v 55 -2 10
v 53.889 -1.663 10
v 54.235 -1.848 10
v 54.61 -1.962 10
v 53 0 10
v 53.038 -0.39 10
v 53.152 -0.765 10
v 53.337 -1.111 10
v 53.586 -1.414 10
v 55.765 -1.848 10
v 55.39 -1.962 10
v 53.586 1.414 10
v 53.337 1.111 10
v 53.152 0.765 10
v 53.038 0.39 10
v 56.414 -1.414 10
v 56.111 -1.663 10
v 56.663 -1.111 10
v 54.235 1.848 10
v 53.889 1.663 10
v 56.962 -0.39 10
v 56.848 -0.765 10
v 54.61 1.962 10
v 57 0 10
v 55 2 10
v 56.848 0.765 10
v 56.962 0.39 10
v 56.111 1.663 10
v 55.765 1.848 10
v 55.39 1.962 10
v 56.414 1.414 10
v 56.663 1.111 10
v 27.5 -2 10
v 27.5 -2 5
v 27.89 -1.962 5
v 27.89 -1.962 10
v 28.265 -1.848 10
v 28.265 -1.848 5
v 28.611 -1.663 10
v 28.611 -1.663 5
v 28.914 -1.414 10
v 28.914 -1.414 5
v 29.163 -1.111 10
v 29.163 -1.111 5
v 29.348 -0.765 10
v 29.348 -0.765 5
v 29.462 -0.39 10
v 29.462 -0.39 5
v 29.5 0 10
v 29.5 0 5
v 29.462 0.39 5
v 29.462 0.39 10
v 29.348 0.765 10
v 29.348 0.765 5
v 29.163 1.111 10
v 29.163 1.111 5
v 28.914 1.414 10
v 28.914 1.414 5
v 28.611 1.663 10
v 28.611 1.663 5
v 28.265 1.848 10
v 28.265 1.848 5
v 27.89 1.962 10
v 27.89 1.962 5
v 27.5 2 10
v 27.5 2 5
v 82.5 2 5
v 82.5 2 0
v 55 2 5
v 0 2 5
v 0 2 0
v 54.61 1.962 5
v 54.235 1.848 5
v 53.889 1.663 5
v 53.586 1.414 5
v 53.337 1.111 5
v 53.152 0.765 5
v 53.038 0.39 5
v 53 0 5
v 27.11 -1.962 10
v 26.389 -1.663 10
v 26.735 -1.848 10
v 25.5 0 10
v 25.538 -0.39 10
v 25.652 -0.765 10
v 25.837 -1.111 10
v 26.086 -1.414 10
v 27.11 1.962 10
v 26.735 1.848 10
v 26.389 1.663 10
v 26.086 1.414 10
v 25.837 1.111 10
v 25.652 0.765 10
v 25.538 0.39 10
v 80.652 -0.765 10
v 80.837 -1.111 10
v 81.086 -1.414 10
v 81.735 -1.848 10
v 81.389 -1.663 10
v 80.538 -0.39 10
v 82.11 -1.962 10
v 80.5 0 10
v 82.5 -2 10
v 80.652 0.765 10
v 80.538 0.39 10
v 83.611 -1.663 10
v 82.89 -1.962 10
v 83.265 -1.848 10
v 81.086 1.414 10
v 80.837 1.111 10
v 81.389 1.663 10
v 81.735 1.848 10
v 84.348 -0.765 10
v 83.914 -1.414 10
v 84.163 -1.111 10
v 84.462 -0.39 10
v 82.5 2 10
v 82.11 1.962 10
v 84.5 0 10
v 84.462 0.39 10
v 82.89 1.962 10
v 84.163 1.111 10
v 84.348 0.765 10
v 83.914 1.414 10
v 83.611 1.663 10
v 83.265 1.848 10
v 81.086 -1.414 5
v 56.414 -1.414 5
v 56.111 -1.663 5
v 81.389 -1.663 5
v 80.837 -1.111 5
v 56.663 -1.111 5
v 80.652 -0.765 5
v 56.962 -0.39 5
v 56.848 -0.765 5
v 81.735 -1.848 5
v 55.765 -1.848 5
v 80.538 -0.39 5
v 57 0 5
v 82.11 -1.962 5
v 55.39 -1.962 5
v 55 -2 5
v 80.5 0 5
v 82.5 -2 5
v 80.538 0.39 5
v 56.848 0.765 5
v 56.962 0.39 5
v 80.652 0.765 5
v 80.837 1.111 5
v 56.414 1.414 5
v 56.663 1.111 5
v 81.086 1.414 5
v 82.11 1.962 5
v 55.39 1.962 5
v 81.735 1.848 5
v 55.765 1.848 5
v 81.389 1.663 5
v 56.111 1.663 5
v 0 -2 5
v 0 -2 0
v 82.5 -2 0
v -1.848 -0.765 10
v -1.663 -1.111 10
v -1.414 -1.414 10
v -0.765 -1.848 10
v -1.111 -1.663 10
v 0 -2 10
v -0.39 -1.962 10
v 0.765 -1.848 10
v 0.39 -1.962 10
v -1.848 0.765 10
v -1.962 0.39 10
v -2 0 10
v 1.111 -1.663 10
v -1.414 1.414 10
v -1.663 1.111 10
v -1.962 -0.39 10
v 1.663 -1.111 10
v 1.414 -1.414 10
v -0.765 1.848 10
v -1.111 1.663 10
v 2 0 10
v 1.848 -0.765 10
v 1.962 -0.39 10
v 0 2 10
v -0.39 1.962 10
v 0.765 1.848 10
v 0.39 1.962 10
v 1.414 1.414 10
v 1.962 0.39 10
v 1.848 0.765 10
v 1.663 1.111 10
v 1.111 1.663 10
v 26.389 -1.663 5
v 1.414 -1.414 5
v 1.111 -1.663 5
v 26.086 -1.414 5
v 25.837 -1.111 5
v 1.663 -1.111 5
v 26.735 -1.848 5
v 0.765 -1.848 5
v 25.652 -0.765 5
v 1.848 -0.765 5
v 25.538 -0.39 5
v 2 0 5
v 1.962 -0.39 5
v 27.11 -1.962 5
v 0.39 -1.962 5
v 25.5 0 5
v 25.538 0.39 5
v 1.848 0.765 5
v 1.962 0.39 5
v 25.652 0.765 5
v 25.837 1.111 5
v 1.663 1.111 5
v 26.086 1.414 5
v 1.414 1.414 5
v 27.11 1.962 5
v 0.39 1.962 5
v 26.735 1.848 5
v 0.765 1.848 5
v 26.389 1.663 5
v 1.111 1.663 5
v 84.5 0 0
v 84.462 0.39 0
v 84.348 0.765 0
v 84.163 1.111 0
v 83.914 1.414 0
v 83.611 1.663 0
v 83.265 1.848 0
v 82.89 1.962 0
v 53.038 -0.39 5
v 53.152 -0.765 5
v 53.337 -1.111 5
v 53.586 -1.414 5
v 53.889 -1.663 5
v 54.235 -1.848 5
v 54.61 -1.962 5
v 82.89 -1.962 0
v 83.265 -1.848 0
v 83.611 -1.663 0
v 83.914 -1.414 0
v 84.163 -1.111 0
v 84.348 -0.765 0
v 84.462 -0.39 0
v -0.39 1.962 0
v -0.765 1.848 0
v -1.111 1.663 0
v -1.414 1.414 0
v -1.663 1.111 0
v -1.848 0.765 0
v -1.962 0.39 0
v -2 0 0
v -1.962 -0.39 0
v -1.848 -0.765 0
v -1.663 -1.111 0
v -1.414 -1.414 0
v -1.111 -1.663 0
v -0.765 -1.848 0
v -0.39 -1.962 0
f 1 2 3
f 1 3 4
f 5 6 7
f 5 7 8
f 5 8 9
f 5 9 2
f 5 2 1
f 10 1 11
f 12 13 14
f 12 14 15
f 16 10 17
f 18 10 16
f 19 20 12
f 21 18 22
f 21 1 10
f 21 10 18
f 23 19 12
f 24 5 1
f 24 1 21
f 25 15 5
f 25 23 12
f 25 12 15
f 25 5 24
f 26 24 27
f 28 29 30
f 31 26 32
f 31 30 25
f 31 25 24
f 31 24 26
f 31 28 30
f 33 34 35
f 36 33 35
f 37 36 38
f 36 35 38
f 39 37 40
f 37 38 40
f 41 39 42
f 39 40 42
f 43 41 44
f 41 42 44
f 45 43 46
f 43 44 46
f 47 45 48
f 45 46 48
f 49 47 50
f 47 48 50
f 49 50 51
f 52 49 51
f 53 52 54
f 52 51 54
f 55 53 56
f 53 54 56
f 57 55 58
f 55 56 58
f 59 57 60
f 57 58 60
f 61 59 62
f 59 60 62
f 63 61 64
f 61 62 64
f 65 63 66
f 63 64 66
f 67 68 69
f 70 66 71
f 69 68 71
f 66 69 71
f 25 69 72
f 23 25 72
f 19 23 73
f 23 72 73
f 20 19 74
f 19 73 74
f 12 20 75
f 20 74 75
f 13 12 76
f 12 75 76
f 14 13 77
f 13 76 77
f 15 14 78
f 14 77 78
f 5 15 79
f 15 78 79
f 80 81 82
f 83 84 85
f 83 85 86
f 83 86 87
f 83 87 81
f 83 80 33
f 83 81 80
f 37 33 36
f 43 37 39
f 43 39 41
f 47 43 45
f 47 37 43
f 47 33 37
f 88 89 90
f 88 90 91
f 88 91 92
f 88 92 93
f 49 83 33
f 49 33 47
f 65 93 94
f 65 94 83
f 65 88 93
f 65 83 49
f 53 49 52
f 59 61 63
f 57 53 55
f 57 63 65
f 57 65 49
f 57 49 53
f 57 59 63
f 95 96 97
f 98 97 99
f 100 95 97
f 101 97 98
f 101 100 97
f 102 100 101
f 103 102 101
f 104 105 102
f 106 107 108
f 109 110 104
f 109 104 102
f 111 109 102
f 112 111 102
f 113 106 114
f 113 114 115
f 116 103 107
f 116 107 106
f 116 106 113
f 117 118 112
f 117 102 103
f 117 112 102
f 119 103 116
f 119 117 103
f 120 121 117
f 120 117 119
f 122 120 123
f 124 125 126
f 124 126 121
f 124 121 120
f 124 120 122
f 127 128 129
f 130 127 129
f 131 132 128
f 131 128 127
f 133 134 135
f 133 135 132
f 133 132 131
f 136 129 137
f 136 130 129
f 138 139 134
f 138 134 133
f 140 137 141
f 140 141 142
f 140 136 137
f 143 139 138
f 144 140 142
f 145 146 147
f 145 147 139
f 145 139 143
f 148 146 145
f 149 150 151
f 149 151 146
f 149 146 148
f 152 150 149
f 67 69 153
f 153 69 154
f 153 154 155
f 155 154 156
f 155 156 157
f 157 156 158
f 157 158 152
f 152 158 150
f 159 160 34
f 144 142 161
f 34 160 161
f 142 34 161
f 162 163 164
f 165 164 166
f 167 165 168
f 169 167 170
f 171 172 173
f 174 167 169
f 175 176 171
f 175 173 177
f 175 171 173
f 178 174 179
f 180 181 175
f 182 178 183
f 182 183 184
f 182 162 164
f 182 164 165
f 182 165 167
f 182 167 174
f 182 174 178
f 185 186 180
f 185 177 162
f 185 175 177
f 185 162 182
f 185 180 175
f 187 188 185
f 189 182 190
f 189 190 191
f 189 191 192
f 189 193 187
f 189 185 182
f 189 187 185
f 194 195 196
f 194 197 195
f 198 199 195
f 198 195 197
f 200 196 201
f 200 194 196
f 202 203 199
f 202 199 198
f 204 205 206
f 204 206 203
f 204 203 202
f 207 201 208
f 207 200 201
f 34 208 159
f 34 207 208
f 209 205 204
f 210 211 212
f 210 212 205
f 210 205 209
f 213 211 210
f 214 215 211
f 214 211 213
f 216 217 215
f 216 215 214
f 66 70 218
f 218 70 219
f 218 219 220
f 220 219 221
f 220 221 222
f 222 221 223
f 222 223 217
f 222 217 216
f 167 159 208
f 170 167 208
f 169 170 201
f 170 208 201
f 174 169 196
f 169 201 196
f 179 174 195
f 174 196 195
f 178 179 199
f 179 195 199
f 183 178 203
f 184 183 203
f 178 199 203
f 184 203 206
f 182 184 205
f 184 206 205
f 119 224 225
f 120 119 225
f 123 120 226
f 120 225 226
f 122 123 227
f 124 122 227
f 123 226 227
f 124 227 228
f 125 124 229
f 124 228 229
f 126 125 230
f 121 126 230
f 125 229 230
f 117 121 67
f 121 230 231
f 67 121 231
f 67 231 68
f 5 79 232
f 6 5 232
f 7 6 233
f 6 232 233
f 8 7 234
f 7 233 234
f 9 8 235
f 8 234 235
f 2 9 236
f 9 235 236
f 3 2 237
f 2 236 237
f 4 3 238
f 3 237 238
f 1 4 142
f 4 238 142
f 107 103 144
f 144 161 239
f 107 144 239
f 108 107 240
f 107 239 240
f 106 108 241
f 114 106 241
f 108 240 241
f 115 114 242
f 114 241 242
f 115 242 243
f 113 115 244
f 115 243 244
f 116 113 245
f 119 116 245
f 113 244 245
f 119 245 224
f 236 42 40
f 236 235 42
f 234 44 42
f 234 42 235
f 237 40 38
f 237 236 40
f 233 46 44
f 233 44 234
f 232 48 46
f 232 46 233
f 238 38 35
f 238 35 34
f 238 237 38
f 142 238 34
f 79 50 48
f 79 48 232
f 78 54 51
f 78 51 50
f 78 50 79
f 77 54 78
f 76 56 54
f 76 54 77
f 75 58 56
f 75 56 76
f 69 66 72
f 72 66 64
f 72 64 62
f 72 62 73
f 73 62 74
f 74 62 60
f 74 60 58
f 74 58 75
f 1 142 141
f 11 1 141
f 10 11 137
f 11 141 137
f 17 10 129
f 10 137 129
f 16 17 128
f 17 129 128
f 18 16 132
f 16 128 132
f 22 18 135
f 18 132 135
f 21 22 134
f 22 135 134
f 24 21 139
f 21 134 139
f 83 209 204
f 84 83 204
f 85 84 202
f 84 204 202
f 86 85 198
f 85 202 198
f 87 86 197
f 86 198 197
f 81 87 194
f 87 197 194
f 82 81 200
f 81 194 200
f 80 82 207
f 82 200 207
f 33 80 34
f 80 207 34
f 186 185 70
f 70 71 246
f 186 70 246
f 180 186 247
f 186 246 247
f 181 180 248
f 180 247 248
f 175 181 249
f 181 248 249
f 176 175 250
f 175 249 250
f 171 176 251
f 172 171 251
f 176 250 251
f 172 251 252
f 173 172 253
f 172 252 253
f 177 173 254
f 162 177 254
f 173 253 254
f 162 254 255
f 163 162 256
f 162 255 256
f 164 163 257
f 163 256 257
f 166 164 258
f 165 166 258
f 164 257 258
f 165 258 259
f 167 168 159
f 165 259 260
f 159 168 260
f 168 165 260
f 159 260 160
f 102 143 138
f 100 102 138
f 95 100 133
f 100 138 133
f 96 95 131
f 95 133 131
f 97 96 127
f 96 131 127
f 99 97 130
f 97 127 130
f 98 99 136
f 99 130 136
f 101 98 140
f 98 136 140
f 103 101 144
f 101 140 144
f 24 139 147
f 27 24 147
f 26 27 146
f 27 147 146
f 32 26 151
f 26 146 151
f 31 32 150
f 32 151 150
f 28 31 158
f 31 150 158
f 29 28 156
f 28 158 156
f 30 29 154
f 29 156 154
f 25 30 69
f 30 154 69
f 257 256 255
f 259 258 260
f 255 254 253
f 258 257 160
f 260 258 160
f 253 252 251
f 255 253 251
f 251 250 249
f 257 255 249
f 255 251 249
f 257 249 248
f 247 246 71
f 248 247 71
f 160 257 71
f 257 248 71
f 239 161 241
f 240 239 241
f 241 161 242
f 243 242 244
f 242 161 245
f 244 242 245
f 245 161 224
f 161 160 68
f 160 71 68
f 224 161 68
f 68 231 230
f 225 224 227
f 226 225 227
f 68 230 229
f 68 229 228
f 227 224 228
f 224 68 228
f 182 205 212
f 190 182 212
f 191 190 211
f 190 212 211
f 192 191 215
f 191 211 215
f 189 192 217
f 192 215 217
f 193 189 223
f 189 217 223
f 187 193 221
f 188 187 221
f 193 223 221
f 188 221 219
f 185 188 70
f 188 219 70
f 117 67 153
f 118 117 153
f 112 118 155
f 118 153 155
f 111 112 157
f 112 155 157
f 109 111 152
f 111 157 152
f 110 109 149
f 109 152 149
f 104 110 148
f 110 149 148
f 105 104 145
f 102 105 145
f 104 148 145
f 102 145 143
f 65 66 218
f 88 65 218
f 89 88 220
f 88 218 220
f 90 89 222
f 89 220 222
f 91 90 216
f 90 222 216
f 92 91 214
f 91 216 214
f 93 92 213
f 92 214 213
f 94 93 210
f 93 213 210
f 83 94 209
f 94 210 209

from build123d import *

# Parameters (mm, degrees)
F1_DEPTH = 5
F2_DEPTH = 10


with BuildPart() as f1:
    # F0 (on Top) → F1 (new body)
    with BuildSketch(Plane.XY):
        with BuildLine():
            Line((25.5, 0), (2, 0))
            ThreePointArc((2, 0), (1.414214, -1.414214), (0, -2))
            Line((0, -2), (27.5, -2))
            ThreePointArc((27.5, -2), (26.085786, -1.414214), (25.5, 0))
        make_face()
        with BuildLine():
            ThreePointArc((0, 2), (1.414214, 1.414214), (2, 0))
            Line((2, 0), (25.5, 0))
            ThreePointArc((25.5, 0), (26.085786, 1.414214), (27.5, 2))
            Line((27.5, 2), (0, 2))
        make_face()
        with BuildLine():
            Line((0, 0), (0, 2))
            ThreePointArc((0, 2), (-2, 0), (0, -2))
            Line((0, -2), (0, 0))
        make_face()
        with BuildLine():
            Line((55, 2), (27.5, 2))
            ThreePointArc((27.5, 2), (28.914214, 1.414214), (29.5, 0))
            Line((29.5, 0), (53, 0))
            ThreePointArc((53, 0), (53.585786, 1.414214), (55, 2))
        make_face()
        with BuildLine():
            ThreePointArc((29.5, 0), (28.914214, -1.414214), (27.5, -2))
            Line((27.5, -2), (55, -2))
            ThreePointArc((55, -2), (53.585786, -1.414214), (53, 0))
            Line((53, 0), (29.5, 0))
        make_face()
        with BuildLine():
            Line((82.5, 2), (55, 2))
            ThreePointArc((55, 2), (56.414214, 1.414214), (57, 0))
            Line((57, 0), (80.5, 0))
            ThreePointArc((80.5, 0), (81.085786, 1.414214), (82.5, 2))
        make_face()
        with BuildLine():
            ThreePointArc((57, 0), (56.414214, -1.414214), (55, -2))
            Line((55, -2), (82.5, -2))
            ThreePointArc((82.5, -2), (81.085786, -1.414214), (80.5, 0))
            Line((80.5, 0), (57, 0))
        make_face()
        with BuildLine():
            ThreePointArc((84.5, 0), (83.914214, 1.414214), (82.5, 2))
            Line((82.5, 2), (82.5, 0))
            Line((82.5, 0), (82.5, -2))
            ThreePointArc((82.5, -2), (83.914214, -1.414214), (84.5, 0))
        make_face()
    extrude(amount=F1_DEPTH)

    # F0 (on Top) → F2 (join)
    with BuildSketch(Plane.XY):
        with BuildLine():
            ThreePointArc((84.5, 0), (83.914214, 1.414214), (82.5, 2))
            Line((82.5, 2), (82.5, 0))
            Line((82.5, 0), (82.5, -2))
            ThreePointArc((82.5, -2), (83.914214, -1.414214), (84.5, 0))
        make_face()
        with BuildLine():
            Line((82.5, 0), (82.5, 2))
            ThreePointArc((82.5, 2), (81.085786, 1.414214), (80.5, 0))
            Line((80.5, 0), (82.5, 0))
        make_face()
        with BuildLine():
            ThreePointArc((80.5, 0), (81.085786, -1.414214), (82.5, -2))
            Line((82.5, -2), (82.5, 0))
            Line((82.5, 0), (80.5, 0))
        make_face()
        with BuildLine():
            ThreePointArc((53, 0), (53.585786, -1.414214), (55, -2))
            ThreePointArc((55, -2), (56.414214, -1.414214), (57, 0))
            Line((57, 0), (55, 0))
            Line((55, 0), (53, 0))
        make_face()
        with BuildLine():
            ThreePointArc((57, 0), (56.414214, 1.414214), (55, 2))
            ThreePointArc((55, 2), (53.585786, 1.414214), (53, 0))
            Line((53, 0), (55, 0))
            Line((55, 0), (57, 0))
        make_face()
        with BuildLine():
            Line((27.5, 0), (25.5, 0))
            ThreePointArc((25.5, 0), (26.085786, -1.414214), (27.5, -2))
            ThreePointArc((27.5, -2), (28.914214, -1.414214), (29.5, 0))
            Line((29.5, 0), (27.5, 0))
        make_face()
        with BuildLine():
            ThreePointArc((27.5, 2), (26.085786, 1.414214), (25.5, 0))
            Line((25.5, 0), (27.5, 0))
            Line((27.5, 0), (29.5, 0))
            ThreePointArc((29.5, 0), (28.914214, 1.414214), (27.5, 2))
        make_face()
        with BuildLine():
            ThreePointArc((0, -2), (1.414214, -1.414214), (2, 0))
            Line((2, 0), (0, 0))
            Line((0, 0), (0, -2))
        make_face()
        with BuildLine():
            Line((0, 0), (0, 2))
            ThreePointArc((0, 2), (-2, 0), (0, -2))
            Line((0, -2), (0, 0))
        make_face()
        with BuildLine():
            Line((0, 0), (2, 0))
            ThreePointArc((2, 0), (1.414214, 1.414214), (0, 2))
            Line((0, 2), (0, 0))
        make_face()
    extrude(amount=F2_DEPTH)


solid = f1.part
